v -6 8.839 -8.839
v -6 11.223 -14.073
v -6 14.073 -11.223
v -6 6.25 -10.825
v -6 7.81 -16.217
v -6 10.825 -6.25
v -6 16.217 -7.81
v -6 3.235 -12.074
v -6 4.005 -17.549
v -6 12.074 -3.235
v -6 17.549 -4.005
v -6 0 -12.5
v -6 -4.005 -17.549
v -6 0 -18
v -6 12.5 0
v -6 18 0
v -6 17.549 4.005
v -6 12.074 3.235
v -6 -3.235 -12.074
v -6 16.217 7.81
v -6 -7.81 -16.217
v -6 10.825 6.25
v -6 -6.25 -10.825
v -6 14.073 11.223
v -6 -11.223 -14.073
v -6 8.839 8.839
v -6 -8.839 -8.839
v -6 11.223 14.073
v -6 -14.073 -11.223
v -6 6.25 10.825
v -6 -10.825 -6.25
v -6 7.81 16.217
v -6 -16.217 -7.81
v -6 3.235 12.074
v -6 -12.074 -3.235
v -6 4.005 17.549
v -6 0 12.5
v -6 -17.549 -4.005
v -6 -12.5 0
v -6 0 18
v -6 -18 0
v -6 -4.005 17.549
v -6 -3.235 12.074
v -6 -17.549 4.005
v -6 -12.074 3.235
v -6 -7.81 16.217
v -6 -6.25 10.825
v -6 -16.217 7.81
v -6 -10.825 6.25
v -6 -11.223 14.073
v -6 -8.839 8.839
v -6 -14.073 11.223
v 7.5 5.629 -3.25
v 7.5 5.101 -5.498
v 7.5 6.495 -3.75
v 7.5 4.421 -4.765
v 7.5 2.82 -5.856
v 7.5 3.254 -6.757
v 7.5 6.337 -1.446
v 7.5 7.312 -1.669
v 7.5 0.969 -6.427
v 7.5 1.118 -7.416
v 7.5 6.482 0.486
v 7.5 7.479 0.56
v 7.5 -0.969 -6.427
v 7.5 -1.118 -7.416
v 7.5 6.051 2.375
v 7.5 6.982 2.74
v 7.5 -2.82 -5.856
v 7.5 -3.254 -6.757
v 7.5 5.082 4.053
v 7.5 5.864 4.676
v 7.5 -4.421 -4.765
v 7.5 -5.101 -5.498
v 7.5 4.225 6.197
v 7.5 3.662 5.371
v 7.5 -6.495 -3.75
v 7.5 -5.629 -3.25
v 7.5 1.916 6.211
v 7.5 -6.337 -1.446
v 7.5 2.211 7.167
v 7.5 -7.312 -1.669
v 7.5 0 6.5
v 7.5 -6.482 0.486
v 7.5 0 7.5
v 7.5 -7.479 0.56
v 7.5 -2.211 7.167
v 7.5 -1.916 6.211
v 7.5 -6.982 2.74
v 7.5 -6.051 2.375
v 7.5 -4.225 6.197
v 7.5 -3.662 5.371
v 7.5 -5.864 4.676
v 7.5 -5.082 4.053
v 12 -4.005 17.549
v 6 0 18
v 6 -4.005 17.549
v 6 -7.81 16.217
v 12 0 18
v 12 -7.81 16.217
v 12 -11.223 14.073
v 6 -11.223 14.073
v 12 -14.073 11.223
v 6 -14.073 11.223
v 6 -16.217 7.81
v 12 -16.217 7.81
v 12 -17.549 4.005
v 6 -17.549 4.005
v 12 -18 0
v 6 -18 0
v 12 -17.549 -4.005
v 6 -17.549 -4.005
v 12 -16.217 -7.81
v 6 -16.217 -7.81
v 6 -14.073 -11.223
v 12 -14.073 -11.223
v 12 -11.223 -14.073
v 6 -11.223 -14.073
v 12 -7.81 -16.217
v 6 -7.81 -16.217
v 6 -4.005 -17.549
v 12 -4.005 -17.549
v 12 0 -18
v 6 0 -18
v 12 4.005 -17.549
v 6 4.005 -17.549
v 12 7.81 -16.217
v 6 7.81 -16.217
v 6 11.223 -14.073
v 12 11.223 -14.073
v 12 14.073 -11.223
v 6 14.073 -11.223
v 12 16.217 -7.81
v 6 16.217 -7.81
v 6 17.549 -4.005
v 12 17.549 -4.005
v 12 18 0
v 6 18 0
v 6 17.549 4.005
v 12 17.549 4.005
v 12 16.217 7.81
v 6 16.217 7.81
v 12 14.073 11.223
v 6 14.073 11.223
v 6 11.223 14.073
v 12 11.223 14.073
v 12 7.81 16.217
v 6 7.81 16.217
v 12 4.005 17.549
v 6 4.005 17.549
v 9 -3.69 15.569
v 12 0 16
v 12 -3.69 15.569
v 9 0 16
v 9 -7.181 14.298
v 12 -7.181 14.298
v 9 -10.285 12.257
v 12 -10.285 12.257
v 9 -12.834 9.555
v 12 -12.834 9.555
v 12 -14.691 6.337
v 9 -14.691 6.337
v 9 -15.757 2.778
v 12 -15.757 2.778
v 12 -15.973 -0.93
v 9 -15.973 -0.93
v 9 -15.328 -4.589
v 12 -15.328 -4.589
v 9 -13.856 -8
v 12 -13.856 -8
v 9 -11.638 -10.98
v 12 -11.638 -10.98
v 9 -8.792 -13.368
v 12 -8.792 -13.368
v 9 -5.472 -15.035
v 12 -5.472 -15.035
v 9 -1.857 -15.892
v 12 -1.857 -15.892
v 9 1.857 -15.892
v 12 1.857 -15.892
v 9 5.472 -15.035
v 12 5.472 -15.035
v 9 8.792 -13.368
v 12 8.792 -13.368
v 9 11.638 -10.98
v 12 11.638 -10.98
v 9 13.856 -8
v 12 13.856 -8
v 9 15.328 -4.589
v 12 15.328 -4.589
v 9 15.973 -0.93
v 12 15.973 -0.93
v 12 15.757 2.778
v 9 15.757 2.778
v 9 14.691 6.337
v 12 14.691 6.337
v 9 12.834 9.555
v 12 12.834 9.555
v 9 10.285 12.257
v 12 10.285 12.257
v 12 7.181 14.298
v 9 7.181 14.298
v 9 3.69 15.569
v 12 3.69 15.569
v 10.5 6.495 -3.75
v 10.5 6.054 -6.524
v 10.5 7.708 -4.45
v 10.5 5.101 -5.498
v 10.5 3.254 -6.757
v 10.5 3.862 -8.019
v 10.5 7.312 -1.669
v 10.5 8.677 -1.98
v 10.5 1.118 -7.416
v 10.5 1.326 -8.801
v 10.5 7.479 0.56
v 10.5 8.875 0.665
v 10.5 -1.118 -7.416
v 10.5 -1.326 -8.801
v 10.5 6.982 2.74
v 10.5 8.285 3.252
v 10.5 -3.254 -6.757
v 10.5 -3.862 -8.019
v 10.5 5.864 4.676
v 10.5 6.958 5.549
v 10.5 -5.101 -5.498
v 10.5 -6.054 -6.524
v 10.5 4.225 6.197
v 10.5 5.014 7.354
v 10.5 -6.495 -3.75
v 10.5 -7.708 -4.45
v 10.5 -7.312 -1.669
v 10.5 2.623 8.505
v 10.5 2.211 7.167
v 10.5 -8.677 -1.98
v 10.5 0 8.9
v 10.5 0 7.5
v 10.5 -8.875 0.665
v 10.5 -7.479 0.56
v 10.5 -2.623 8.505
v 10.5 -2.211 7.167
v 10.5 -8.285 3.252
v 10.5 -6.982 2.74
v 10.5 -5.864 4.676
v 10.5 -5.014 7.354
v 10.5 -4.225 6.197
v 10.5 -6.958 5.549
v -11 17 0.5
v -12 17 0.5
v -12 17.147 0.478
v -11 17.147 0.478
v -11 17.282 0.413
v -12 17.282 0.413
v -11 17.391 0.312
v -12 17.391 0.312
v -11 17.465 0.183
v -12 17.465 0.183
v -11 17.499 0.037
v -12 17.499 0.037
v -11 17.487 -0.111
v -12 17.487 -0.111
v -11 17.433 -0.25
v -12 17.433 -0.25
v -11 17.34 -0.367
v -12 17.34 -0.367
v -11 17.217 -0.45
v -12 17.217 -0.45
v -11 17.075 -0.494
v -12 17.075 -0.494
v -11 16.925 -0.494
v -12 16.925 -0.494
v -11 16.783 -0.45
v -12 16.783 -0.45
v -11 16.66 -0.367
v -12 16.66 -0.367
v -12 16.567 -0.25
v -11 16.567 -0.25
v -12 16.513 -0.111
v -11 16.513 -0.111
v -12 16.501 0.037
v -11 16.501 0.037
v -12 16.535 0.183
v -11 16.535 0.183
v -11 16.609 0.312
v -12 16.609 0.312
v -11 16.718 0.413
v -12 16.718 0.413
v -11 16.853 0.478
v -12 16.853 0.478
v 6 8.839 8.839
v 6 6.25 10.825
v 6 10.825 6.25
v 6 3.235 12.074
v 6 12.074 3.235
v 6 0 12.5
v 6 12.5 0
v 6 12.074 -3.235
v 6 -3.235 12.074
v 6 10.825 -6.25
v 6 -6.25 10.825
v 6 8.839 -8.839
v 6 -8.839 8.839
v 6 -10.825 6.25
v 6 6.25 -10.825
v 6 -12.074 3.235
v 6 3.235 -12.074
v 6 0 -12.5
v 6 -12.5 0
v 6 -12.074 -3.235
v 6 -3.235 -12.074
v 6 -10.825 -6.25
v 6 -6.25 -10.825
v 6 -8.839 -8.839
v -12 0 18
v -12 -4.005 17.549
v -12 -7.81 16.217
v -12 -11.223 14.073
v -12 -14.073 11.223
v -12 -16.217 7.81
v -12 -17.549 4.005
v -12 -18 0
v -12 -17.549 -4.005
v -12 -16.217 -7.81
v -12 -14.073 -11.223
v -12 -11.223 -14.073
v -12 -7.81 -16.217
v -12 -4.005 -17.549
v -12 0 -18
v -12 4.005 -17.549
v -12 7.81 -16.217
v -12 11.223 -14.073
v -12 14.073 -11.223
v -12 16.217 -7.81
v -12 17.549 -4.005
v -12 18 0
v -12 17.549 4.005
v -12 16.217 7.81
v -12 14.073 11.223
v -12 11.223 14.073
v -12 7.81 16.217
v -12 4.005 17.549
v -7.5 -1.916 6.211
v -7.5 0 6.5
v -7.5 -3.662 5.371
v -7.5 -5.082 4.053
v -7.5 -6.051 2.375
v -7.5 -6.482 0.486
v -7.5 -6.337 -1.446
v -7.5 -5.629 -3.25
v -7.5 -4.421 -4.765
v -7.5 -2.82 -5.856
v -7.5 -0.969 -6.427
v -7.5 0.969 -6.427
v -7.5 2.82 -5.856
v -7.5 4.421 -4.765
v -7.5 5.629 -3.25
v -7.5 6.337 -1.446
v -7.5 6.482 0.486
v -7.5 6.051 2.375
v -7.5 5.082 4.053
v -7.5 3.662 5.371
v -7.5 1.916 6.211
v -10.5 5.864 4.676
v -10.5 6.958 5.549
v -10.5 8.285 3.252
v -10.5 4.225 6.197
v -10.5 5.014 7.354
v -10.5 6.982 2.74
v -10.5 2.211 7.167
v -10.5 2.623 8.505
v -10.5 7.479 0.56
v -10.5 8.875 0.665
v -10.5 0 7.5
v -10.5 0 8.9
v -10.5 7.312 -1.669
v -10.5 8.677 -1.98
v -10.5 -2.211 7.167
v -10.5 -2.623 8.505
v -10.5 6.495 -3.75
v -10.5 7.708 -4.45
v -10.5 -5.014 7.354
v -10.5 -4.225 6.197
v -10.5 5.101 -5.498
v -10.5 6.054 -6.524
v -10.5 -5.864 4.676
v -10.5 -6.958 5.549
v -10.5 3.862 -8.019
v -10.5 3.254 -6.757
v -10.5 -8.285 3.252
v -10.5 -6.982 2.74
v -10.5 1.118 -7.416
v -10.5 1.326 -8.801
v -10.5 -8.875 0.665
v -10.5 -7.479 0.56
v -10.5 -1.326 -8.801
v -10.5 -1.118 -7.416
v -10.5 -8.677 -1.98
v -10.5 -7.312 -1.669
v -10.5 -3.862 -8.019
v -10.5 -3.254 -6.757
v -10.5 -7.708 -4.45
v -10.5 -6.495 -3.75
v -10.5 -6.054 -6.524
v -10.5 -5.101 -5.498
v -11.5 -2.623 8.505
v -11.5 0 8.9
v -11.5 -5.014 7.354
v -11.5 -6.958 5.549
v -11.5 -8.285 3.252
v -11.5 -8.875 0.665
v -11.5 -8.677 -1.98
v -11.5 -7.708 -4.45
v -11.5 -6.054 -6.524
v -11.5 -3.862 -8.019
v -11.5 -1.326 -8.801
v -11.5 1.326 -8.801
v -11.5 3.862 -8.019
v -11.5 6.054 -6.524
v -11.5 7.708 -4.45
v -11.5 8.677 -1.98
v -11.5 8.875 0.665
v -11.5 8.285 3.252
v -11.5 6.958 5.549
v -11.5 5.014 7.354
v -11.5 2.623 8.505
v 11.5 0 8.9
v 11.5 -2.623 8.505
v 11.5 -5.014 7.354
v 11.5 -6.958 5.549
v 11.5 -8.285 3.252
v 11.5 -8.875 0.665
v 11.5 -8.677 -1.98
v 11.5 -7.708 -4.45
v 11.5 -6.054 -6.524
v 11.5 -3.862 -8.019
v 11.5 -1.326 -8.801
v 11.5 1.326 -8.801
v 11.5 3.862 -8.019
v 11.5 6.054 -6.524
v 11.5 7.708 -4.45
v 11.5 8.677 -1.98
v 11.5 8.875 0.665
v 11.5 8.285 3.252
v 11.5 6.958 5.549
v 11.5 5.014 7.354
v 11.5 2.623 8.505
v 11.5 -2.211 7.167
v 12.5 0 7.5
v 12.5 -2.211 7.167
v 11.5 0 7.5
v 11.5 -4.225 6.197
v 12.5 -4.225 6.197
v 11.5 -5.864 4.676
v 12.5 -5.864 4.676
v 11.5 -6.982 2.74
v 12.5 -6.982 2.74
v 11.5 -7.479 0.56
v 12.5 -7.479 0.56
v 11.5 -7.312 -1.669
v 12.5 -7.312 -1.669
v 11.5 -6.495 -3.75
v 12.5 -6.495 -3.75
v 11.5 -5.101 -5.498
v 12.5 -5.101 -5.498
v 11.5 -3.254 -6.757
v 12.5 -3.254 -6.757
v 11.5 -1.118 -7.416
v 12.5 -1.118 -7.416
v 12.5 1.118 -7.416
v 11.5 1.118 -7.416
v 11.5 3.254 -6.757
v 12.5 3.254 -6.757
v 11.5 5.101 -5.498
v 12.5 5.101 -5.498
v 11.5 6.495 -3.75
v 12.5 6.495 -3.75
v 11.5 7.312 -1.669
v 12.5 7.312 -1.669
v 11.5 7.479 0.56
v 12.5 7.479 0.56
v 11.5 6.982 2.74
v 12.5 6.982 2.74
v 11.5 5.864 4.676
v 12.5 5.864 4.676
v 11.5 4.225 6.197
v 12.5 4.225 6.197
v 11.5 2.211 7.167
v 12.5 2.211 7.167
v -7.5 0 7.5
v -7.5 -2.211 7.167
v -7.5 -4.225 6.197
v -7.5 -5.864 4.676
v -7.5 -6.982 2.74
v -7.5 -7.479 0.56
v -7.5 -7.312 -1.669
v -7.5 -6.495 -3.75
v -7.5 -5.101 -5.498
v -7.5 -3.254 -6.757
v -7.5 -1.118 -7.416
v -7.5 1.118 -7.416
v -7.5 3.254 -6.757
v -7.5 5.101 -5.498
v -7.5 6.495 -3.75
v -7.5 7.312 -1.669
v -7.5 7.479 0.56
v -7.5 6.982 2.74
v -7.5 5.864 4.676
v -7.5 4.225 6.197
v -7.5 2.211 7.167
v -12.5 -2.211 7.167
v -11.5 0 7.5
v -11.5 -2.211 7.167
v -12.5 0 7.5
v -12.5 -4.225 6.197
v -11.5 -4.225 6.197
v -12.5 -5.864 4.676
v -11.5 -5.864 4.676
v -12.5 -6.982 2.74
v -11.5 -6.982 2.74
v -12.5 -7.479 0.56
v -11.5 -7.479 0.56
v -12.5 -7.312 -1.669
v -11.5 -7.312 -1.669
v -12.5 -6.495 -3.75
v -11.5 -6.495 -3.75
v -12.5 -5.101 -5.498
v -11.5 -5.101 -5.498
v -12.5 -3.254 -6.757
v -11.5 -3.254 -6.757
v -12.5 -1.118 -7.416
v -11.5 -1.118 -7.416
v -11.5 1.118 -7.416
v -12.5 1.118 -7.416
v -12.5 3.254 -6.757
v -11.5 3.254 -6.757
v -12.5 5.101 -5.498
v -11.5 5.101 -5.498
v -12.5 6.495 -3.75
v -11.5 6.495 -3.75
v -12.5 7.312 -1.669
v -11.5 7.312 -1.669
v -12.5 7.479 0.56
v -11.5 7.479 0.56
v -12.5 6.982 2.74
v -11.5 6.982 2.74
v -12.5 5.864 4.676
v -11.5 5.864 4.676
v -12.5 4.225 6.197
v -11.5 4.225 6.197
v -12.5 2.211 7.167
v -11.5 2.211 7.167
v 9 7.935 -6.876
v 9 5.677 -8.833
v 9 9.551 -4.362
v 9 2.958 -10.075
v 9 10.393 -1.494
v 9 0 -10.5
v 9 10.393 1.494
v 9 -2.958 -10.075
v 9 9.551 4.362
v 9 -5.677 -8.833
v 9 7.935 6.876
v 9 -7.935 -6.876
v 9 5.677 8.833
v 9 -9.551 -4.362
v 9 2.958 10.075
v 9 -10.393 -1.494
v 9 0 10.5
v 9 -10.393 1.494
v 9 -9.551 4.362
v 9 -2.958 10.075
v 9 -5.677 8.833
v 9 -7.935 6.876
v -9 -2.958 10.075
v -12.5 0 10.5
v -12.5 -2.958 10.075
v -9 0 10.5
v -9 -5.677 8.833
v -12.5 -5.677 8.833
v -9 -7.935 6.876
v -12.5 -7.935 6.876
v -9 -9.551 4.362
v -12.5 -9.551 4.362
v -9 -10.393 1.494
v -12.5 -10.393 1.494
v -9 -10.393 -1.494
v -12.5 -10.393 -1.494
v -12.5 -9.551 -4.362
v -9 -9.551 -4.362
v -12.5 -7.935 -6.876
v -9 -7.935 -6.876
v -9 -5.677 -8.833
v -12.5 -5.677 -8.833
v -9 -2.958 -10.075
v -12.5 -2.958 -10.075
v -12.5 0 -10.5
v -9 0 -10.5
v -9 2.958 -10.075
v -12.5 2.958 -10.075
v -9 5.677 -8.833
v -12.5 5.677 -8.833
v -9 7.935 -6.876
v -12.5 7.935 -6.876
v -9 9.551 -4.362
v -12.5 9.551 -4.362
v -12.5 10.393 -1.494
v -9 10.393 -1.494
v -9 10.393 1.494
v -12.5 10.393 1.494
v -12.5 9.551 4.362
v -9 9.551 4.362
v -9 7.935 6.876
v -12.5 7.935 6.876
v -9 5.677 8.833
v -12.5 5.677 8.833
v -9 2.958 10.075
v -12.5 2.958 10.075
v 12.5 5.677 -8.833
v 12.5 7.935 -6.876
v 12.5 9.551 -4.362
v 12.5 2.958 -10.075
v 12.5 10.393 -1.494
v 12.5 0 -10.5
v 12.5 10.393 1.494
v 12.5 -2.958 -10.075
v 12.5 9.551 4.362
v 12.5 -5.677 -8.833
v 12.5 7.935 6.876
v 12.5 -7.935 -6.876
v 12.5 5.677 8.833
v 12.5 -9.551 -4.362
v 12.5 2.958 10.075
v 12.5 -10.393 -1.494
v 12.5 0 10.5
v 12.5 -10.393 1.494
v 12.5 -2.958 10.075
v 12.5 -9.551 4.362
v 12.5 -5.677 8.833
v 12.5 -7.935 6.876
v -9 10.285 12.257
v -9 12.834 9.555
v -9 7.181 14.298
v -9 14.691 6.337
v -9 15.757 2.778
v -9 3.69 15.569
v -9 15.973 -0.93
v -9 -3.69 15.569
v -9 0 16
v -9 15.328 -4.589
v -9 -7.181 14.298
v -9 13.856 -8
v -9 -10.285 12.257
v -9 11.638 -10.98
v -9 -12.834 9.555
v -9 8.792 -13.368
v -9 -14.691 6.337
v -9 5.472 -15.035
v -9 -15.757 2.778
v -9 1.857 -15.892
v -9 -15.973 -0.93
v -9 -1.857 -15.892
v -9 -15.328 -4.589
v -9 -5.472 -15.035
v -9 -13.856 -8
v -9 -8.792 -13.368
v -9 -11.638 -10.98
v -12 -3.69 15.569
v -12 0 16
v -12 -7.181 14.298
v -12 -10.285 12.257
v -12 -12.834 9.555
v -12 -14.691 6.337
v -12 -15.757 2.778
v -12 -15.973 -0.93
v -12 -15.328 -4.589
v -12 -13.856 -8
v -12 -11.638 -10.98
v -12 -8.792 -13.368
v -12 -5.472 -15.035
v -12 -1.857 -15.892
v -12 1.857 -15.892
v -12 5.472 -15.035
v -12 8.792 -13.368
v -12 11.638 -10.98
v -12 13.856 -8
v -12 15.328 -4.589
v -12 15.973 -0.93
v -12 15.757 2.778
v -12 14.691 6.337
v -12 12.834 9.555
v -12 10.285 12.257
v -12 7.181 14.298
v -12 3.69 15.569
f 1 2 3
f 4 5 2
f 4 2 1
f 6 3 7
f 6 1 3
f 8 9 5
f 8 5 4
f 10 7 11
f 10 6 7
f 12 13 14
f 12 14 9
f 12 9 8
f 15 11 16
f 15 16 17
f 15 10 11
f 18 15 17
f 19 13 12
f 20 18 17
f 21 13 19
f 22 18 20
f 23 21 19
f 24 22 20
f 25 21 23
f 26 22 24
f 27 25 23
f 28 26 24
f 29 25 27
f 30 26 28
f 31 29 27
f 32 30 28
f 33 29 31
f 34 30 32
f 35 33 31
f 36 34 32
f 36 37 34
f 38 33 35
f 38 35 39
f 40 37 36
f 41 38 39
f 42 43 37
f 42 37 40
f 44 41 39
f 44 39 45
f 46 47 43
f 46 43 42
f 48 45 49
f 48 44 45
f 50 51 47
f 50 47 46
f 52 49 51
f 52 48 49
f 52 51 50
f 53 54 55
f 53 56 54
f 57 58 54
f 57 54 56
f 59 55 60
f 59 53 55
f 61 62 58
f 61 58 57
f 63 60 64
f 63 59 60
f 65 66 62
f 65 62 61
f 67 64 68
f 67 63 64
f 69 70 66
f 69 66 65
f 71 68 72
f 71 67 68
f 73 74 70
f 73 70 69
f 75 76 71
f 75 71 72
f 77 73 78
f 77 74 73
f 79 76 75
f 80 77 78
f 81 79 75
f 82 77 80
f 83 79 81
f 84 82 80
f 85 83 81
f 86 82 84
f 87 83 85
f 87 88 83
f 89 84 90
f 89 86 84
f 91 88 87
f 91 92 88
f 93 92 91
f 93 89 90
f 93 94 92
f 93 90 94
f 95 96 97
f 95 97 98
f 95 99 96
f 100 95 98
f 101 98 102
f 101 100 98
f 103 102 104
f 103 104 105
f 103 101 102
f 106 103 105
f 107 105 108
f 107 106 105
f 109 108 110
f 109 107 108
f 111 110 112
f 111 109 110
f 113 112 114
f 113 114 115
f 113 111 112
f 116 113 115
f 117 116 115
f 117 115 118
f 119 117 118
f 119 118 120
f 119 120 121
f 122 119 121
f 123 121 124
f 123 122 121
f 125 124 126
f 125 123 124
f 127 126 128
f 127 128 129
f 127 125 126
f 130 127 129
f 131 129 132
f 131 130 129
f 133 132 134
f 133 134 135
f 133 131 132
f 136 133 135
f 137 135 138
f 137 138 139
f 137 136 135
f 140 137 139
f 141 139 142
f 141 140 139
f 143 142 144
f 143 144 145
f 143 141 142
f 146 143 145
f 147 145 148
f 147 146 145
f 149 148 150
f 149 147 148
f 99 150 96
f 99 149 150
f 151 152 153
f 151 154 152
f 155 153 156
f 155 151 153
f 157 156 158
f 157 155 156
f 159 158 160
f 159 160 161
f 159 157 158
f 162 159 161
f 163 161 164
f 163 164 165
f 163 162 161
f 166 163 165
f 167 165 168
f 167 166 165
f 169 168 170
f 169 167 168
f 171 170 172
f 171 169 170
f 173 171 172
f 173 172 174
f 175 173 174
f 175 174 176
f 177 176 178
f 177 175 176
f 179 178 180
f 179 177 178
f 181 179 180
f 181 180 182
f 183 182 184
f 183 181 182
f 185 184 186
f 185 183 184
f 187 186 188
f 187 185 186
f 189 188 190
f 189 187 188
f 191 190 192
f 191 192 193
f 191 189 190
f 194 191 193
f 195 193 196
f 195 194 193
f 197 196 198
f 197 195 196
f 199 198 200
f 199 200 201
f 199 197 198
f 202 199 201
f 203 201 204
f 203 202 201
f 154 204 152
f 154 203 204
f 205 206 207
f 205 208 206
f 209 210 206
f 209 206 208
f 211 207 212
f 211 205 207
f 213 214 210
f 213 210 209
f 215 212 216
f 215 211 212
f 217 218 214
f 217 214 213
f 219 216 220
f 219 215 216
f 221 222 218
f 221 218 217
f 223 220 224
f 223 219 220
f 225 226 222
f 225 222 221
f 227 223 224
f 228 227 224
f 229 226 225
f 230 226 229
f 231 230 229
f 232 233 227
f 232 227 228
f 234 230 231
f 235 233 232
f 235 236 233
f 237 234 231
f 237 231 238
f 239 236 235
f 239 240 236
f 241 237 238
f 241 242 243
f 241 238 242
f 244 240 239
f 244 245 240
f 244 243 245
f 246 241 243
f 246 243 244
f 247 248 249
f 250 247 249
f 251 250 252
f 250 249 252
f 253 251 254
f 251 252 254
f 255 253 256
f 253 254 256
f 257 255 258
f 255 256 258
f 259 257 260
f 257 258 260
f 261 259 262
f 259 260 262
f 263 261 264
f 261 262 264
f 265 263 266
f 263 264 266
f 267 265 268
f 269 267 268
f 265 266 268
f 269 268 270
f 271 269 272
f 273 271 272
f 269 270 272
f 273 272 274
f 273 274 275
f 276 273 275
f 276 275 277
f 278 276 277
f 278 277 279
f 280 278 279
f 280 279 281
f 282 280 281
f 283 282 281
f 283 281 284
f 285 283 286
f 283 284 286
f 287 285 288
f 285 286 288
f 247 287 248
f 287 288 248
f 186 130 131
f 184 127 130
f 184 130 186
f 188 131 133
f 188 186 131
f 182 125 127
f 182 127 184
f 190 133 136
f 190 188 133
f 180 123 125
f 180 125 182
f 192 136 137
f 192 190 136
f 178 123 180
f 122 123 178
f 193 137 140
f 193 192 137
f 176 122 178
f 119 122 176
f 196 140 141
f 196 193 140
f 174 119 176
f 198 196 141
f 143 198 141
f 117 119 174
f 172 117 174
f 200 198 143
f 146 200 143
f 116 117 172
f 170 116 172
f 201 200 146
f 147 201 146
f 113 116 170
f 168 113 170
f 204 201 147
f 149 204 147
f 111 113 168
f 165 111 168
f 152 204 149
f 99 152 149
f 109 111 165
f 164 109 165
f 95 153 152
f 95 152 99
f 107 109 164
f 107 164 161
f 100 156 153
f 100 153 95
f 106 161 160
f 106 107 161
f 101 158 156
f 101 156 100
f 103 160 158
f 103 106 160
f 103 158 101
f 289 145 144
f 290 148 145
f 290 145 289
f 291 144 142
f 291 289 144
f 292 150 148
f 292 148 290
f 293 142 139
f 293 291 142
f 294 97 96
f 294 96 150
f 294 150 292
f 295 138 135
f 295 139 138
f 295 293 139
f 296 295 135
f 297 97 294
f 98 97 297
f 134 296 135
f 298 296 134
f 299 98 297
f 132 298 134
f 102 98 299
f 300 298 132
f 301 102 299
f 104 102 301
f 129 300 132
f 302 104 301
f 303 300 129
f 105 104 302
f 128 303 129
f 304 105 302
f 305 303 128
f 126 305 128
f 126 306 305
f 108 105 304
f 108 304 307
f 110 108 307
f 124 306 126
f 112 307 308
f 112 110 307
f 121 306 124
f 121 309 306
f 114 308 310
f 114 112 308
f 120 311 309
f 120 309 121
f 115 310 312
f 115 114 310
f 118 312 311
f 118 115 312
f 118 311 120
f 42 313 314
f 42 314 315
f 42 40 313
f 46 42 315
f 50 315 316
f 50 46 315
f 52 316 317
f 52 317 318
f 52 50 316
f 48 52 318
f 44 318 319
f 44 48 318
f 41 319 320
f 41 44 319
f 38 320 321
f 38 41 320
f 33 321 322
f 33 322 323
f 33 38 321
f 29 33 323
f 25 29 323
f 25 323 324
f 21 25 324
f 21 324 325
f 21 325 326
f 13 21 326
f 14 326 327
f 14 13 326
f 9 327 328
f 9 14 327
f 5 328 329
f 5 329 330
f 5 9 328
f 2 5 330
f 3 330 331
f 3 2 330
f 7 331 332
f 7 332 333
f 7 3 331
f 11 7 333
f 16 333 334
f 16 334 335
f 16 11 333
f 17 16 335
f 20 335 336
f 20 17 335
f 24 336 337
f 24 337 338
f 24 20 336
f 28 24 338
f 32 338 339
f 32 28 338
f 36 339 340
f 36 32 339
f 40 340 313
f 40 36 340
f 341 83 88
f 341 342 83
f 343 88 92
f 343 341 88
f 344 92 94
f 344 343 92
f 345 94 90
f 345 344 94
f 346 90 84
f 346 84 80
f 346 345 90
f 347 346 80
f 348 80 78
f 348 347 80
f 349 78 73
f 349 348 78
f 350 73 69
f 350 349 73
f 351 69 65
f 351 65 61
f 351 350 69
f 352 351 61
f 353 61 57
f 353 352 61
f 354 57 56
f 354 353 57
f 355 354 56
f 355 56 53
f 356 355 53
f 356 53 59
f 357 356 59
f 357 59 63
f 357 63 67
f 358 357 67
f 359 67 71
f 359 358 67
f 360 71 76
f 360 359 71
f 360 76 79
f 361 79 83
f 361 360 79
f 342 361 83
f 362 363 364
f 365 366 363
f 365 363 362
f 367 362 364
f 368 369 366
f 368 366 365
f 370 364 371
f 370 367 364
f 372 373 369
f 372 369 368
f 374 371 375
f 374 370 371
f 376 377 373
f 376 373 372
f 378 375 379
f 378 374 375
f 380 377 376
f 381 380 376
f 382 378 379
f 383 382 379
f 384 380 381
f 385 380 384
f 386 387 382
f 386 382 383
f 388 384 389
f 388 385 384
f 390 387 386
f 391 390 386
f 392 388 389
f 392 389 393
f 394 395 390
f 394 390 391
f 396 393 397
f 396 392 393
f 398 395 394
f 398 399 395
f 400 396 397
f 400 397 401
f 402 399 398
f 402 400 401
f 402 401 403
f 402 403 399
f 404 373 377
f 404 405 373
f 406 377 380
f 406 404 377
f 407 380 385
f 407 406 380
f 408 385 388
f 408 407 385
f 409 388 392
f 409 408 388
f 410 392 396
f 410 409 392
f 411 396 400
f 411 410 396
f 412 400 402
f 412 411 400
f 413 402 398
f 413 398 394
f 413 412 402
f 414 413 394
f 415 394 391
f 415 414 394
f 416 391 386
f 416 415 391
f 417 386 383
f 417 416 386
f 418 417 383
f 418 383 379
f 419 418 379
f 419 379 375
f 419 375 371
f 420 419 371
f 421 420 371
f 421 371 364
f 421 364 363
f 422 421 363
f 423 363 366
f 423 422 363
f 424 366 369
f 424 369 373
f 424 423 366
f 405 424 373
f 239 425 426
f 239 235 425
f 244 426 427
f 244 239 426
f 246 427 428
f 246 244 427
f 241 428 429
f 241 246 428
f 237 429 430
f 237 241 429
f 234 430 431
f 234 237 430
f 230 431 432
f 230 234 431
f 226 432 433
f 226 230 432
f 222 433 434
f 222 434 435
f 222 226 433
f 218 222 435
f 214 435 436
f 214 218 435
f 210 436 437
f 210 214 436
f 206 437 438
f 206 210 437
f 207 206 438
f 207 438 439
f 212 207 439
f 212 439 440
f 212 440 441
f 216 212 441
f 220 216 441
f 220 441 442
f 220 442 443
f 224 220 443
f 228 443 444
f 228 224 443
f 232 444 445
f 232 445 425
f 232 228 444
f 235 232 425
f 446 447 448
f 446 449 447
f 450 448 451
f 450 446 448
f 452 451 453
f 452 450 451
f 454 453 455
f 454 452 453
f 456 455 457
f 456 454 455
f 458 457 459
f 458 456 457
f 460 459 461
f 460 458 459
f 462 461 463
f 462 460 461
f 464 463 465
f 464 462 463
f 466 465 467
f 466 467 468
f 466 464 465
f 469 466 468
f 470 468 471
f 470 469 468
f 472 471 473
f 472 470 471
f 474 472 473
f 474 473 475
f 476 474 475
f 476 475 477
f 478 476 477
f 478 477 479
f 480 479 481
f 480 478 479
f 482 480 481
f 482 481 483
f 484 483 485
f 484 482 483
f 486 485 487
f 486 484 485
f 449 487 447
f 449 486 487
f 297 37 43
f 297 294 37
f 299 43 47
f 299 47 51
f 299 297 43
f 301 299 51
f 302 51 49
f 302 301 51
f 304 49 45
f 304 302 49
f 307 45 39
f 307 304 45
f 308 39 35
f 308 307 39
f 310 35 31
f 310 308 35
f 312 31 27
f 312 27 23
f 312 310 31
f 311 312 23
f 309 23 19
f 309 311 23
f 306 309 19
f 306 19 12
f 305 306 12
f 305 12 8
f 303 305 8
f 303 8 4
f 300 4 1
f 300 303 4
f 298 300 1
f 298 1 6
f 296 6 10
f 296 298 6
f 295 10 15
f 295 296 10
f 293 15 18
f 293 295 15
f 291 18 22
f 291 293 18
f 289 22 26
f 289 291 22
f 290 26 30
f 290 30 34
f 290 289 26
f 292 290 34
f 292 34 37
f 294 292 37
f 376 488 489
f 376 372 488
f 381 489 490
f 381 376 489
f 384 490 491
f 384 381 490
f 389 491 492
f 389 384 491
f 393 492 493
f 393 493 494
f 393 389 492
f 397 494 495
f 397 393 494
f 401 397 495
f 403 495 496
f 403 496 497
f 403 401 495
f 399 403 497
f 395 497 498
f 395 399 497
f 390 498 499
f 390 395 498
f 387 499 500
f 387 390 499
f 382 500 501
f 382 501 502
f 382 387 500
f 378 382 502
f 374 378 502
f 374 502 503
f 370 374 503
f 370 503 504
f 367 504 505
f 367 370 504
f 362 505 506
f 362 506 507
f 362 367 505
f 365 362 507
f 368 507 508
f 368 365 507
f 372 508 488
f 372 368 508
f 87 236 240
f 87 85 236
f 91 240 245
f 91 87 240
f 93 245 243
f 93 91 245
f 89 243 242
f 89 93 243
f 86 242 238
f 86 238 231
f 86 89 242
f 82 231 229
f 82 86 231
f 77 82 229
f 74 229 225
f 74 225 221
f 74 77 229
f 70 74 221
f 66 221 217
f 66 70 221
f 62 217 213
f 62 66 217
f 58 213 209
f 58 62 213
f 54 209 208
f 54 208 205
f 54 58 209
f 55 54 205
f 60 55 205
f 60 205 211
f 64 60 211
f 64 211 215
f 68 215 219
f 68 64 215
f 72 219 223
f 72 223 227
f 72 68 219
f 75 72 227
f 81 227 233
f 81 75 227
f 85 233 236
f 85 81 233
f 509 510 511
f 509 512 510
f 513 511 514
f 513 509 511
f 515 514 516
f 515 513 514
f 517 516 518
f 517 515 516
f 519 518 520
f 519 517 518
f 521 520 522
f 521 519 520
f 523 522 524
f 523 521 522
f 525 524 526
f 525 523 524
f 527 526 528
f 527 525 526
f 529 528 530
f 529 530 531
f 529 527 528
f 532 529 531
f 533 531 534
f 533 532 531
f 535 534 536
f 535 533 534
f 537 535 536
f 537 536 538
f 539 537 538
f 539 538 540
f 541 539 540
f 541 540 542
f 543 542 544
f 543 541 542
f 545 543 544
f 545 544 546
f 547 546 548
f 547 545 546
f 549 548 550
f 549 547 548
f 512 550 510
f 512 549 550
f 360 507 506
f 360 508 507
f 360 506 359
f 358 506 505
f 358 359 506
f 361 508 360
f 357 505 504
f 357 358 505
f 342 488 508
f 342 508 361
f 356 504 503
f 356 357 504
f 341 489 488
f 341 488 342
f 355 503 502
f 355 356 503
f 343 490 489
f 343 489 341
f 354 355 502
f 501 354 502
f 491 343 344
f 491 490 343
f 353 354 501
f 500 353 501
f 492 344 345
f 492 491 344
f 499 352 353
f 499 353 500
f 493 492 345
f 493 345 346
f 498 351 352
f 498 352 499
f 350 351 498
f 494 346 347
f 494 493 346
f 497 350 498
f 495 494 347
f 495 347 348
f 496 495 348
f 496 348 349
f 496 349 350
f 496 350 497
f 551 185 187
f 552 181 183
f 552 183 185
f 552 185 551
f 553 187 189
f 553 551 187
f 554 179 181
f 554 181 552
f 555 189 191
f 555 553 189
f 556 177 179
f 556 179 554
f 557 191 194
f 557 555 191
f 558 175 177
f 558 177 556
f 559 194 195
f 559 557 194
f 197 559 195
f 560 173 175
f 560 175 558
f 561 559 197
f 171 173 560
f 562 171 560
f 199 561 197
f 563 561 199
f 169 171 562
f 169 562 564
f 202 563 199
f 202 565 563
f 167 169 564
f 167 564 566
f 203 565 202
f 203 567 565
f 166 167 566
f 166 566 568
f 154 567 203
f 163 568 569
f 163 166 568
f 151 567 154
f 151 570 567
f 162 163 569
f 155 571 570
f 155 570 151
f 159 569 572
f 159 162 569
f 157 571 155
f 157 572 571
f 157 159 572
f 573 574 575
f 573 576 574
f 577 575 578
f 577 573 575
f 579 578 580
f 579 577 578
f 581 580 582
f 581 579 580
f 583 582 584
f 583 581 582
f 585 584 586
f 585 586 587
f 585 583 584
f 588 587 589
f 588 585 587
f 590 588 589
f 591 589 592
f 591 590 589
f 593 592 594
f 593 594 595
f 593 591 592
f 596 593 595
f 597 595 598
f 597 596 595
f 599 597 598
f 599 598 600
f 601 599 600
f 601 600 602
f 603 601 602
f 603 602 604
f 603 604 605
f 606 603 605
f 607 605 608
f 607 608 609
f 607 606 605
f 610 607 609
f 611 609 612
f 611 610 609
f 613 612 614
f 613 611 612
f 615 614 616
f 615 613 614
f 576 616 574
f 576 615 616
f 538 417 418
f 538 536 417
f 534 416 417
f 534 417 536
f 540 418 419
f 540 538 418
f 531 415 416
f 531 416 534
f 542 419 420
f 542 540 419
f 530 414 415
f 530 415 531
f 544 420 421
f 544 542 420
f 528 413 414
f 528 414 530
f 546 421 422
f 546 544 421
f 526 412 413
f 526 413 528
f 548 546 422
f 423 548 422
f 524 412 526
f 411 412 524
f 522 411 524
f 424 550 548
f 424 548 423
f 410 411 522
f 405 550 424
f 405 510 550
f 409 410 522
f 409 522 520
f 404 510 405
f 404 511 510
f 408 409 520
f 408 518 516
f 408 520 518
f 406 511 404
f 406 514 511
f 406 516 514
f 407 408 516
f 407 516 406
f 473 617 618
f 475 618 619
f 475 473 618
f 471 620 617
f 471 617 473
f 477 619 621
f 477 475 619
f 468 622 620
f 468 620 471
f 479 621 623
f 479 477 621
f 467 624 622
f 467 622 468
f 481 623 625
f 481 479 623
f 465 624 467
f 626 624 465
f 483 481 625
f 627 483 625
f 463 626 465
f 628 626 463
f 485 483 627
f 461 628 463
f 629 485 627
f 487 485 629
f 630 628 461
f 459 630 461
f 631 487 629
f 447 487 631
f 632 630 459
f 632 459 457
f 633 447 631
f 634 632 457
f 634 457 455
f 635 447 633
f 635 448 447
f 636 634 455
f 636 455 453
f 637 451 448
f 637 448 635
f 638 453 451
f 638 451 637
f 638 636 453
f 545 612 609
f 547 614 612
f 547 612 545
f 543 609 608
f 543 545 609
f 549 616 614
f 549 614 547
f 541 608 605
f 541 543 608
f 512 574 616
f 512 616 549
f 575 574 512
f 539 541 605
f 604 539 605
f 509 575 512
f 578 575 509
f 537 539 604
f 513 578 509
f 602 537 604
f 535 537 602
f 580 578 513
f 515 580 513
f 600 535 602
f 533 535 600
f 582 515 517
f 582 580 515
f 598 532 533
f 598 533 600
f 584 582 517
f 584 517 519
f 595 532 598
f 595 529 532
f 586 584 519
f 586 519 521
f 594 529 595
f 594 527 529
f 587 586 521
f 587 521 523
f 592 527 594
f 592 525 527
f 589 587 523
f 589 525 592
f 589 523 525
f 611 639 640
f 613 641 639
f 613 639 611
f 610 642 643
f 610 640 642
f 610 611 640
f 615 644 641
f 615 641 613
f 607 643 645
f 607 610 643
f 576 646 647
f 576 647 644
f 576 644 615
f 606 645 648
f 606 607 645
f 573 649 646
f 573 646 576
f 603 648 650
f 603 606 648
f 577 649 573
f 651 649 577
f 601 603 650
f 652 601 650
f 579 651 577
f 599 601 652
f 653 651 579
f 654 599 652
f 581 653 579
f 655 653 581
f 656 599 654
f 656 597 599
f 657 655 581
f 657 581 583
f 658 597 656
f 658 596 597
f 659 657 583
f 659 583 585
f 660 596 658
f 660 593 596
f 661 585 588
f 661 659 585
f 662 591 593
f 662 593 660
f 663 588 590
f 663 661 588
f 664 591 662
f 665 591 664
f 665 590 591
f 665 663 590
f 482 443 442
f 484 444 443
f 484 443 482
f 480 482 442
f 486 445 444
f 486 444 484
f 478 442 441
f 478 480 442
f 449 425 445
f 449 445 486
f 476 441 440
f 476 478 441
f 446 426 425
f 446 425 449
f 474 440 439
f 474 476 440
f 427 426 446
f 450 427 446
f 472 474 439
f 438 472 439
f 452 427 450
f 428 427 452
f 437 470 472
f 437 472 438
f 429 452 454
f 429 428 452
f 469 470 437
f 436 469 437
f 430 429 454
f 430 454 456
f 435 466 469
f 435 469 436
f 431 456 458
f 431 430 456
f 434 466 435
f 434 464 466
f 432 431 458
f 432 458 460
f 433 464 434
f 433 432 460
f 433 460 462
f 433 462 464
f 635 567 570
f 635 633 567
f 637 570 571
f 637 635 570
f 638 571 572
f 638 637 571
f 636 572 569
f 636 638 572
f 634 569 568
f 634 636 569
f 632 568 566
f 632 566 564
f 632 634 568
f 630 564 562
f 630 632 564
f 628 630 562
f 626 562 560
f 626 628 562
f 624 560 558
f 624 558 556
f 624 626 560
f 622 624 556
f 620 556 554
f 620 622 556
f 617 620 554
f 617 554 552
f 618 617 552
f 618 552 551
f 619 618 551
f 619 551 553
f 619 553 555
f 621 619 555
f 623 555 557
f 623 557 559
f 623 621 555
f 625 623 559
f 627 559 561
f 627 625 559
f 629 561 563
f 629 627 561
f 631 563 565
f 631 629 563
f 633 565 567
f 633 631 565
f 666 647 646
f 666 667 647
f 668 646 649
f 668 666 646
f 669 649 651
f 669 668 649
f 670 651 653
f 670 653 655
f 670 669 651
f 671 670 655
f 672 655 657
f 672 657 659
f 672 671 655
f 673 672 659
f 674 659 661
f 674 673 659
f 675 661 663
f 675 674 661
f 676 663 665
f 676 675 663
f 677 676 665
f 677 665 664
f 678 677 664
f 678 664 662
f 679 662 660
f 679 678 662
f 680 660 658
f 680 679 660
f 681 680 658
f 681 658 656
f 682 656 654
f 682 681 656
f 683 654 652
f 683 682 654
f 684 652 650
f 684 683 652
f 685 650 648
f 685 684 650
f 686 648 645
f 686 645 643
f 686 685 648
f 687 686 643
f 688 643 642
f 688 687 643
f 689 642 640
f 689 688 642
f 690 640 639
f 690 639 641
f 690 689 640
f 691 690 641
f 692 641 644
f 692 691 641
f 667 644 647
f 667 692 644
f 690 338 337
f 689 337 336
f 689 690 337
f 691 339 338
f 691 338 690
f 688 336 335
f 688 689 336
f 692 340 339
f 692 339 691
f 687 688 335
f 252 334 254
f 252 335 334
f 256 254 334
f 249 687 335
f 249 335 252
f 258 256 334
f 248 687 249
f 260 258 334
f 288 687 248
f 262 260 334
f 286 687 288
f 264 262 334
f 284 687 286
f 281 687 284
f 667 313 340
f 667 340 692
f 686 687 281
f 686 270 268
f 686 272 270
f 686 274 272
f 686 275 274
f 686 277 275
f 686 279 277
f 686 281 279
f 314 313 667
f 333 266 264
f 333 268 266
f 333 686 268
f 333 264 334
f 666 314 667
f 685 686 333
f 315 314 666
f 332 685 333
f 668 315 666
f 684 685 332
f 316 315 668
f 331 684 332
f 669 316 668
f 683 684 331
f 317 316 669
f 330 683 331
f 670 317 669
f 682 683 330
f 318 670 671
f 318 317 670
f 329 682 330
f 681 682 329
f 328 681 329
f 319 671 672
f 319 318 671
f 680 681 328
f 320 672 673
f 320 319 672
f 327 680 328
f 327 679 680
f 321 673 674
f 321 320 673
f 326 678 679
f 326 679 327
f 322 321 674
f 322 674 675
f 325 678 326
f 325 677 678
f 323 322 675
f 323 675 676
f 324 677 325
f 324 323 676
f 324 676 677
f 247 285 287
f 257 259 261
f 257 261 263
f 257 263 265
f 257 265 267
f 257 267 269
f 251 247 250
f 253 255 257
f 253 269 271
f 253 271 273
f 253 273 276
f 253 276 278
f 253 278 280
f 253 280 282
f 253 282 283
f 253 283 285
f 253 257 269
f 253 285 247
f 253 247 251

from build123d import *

# Parameters (mm, degrees)
SZKIC2_R                   = 0.5
WYTNIJ_WYCI_GNI_CIE1_DEPTH = 1


with BuildPart() as part:
    # Szkic1 → Obrót1 (revolve)
    with BuildSketch(Plane.XY, mode=Mode.PRIVATE) as obr_t1_sk:
        Polygon((-6, 12.5), (6, 12.5), (6, 18), (12, 18), (12, 16), (9, 16), (9, 10.5), (12.5, 10.5), (12.5, 7.5), (11.5, 7.5), (11.5, 8.9), (10.5, 8.9), (10.5, 7.5), (7.5, 7.5), (7.5, 6.5), (-7.5, 6.5), (-7.5, 7.5), (-10.5, 7.5), (-10.5, 8.9), (-11.5, 8.9), (-11.5, 7.5), (-12.5, 7.5), (-12.5, 10.5), (-9, 10.5), (-9, 16), (-12, 16), (-12, 18), (-6, 18), align=None)
    revolve(obr_t1_sk.sketch.rotate(Axis((-12.5, 0, 0), (1, 0, 0)), 90), axis=Axis((-12.5, 0, 0), (1, 0, 0)))

    # Szkic2 → Wytnij-wyciągnięcie1 (cut)
    with BuildSketch(Plane.ZY.offset(12)):
        with Locations((0, 17)):
            Circle(SZKIC2_R)
    extrude(amount=-WYTNIJ_WYCI_GNI_CIE1_DEPTH, mode=Mode.SUBTRACT)


solid = part.part
